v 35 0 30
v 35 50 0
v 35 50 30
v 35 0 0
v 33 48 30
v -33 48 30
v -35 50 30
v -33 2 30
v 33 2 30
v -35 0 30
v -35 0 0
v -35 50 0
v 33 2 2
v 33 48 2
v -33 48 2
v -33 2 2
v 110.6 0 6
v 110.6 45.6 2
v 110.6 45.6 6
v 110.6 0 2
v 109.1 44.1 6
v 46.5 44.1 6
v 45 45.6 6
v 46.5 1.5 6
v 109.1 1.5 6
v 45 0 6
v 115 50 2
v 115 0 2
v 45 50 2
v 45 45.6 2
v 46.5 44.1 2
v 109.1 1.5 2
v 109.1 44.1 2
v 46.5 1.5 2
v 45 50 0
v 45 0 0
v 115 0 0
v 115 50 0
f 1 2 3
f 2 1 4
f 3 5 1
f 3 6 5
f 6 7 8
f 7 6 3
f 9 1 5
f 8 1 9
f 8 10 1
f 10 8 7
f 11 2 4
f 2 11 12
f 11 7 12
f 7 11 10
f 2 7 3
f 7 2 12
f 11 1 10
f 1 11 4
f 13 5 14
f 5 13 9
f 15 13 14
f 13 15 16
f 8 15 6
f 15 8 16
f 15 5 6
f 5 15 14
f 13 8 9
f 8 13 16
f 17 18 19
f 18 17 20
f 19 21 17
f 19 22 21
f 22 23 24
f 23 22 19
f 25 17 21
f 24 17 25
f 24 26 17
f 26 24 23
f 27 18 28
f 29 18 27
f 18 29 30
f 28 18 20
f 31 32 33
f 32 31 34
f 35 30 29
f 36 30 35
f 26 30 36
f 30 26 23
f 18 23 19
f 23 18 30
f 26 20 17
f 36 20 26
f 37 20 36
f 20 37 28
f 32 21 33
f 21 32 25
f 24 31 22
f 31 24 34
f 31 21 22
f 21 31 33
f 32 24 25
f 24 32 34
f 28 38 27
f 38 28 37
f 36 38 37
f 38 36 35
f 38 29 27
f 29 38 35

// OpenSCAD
// Two-part enclosure for a small electronics board (e.g. Arduino temperature logger)
// Both parts are modelled in their print orientation (resting on the XY plane at z = 0,
// building upward in +Z) and placed side by side with a 10 mm gap between them.

// ---------- Global ----------
$fn = 64;

// ---------- Part 1: Box ----------
box_outer_x = 70;   // outer width  (X)
box_outer_y = 50;   // outer depth  (Y)
box_outer_z = 30;   // outer height (Z)
box_wall    = 2;    // wall thickness
box_floor   = 2;    // floor thickness

// ---------- Part 2: Lid (printed upside down) ----------
lid_plate_x   = 70;    // plate width  (X)
lid_plate_y   = 50;    // plate depth  (Y)
lid_plate_z   = 2;     // plate thickness (Z)
lid_wall      = 1.5;   // lip wall thickness
lip_height    = 4;     // lip height above the plate
lip_outer_x   = 65.6;  // lip outer width  (X)
lip_outer_y   = 45.6;  // lip outer depth  (Y)

// ---------- Placement ----------
gap = 10;  // gap between the two parts

// Box occupies X in [-35, 35], Y in [-25, 25]
// Lid  occupies X in [ 45, 115], Y in [-25, 25]  (10 mm gap between them)
box_x0 = -box_outer_x / 2;
lid_x0 = box_outer_x / 2 + gap;

// ---------- Part 1: Box (open top, 2 mm walls, 2 mm floor) ----------
translate([box_x0, 0, 0]) {
    difference() {
        // outer solid
        cube([box_outer_x, box_outer_y, box_outer_z], center = [true, true, false]);
        // interior cavity (open at the top)
        translate([box_wall, box_wall, box_floor]) {
            cube([box_outer_x - 2 * box_wall,
                  box_outer_y - 2 * box_wall,
                  box_outer_z - box_floor + 1],   // +1 mm so the cut extends past the top face
                  center = [false, false, false]);
        }
    }
}

// ---------- Part 2: Lid (printed upside down: plate on bed, lip on top) ----------
translate([lid_x0, 0, 0]) {
    // plate lying on the bed
    cube([lid_plate_x, lid_plate_y, lid_plate_z], center = [true, true, false]);

    // rectangular lip on top of the plate, centred on the plate
    translate([0, 0, lid_plate_z]) {
        difference() {
            // outer lip block
            cube([lip_outer_x, lip_outer_y, lip_height], center = [true, true, false]);
            // hollow interior of the lip (cut extends 1 mm past the top face)
            translate([lid_wall, lid_wall, 0]) {
                cube([lip_outer_x - 2 * lid_wall,
                      lip_outer_y - 2 * lid_wall,
                      lip_height + 1],
                      center = [false, false, false]);
            }
        }
    }
}
